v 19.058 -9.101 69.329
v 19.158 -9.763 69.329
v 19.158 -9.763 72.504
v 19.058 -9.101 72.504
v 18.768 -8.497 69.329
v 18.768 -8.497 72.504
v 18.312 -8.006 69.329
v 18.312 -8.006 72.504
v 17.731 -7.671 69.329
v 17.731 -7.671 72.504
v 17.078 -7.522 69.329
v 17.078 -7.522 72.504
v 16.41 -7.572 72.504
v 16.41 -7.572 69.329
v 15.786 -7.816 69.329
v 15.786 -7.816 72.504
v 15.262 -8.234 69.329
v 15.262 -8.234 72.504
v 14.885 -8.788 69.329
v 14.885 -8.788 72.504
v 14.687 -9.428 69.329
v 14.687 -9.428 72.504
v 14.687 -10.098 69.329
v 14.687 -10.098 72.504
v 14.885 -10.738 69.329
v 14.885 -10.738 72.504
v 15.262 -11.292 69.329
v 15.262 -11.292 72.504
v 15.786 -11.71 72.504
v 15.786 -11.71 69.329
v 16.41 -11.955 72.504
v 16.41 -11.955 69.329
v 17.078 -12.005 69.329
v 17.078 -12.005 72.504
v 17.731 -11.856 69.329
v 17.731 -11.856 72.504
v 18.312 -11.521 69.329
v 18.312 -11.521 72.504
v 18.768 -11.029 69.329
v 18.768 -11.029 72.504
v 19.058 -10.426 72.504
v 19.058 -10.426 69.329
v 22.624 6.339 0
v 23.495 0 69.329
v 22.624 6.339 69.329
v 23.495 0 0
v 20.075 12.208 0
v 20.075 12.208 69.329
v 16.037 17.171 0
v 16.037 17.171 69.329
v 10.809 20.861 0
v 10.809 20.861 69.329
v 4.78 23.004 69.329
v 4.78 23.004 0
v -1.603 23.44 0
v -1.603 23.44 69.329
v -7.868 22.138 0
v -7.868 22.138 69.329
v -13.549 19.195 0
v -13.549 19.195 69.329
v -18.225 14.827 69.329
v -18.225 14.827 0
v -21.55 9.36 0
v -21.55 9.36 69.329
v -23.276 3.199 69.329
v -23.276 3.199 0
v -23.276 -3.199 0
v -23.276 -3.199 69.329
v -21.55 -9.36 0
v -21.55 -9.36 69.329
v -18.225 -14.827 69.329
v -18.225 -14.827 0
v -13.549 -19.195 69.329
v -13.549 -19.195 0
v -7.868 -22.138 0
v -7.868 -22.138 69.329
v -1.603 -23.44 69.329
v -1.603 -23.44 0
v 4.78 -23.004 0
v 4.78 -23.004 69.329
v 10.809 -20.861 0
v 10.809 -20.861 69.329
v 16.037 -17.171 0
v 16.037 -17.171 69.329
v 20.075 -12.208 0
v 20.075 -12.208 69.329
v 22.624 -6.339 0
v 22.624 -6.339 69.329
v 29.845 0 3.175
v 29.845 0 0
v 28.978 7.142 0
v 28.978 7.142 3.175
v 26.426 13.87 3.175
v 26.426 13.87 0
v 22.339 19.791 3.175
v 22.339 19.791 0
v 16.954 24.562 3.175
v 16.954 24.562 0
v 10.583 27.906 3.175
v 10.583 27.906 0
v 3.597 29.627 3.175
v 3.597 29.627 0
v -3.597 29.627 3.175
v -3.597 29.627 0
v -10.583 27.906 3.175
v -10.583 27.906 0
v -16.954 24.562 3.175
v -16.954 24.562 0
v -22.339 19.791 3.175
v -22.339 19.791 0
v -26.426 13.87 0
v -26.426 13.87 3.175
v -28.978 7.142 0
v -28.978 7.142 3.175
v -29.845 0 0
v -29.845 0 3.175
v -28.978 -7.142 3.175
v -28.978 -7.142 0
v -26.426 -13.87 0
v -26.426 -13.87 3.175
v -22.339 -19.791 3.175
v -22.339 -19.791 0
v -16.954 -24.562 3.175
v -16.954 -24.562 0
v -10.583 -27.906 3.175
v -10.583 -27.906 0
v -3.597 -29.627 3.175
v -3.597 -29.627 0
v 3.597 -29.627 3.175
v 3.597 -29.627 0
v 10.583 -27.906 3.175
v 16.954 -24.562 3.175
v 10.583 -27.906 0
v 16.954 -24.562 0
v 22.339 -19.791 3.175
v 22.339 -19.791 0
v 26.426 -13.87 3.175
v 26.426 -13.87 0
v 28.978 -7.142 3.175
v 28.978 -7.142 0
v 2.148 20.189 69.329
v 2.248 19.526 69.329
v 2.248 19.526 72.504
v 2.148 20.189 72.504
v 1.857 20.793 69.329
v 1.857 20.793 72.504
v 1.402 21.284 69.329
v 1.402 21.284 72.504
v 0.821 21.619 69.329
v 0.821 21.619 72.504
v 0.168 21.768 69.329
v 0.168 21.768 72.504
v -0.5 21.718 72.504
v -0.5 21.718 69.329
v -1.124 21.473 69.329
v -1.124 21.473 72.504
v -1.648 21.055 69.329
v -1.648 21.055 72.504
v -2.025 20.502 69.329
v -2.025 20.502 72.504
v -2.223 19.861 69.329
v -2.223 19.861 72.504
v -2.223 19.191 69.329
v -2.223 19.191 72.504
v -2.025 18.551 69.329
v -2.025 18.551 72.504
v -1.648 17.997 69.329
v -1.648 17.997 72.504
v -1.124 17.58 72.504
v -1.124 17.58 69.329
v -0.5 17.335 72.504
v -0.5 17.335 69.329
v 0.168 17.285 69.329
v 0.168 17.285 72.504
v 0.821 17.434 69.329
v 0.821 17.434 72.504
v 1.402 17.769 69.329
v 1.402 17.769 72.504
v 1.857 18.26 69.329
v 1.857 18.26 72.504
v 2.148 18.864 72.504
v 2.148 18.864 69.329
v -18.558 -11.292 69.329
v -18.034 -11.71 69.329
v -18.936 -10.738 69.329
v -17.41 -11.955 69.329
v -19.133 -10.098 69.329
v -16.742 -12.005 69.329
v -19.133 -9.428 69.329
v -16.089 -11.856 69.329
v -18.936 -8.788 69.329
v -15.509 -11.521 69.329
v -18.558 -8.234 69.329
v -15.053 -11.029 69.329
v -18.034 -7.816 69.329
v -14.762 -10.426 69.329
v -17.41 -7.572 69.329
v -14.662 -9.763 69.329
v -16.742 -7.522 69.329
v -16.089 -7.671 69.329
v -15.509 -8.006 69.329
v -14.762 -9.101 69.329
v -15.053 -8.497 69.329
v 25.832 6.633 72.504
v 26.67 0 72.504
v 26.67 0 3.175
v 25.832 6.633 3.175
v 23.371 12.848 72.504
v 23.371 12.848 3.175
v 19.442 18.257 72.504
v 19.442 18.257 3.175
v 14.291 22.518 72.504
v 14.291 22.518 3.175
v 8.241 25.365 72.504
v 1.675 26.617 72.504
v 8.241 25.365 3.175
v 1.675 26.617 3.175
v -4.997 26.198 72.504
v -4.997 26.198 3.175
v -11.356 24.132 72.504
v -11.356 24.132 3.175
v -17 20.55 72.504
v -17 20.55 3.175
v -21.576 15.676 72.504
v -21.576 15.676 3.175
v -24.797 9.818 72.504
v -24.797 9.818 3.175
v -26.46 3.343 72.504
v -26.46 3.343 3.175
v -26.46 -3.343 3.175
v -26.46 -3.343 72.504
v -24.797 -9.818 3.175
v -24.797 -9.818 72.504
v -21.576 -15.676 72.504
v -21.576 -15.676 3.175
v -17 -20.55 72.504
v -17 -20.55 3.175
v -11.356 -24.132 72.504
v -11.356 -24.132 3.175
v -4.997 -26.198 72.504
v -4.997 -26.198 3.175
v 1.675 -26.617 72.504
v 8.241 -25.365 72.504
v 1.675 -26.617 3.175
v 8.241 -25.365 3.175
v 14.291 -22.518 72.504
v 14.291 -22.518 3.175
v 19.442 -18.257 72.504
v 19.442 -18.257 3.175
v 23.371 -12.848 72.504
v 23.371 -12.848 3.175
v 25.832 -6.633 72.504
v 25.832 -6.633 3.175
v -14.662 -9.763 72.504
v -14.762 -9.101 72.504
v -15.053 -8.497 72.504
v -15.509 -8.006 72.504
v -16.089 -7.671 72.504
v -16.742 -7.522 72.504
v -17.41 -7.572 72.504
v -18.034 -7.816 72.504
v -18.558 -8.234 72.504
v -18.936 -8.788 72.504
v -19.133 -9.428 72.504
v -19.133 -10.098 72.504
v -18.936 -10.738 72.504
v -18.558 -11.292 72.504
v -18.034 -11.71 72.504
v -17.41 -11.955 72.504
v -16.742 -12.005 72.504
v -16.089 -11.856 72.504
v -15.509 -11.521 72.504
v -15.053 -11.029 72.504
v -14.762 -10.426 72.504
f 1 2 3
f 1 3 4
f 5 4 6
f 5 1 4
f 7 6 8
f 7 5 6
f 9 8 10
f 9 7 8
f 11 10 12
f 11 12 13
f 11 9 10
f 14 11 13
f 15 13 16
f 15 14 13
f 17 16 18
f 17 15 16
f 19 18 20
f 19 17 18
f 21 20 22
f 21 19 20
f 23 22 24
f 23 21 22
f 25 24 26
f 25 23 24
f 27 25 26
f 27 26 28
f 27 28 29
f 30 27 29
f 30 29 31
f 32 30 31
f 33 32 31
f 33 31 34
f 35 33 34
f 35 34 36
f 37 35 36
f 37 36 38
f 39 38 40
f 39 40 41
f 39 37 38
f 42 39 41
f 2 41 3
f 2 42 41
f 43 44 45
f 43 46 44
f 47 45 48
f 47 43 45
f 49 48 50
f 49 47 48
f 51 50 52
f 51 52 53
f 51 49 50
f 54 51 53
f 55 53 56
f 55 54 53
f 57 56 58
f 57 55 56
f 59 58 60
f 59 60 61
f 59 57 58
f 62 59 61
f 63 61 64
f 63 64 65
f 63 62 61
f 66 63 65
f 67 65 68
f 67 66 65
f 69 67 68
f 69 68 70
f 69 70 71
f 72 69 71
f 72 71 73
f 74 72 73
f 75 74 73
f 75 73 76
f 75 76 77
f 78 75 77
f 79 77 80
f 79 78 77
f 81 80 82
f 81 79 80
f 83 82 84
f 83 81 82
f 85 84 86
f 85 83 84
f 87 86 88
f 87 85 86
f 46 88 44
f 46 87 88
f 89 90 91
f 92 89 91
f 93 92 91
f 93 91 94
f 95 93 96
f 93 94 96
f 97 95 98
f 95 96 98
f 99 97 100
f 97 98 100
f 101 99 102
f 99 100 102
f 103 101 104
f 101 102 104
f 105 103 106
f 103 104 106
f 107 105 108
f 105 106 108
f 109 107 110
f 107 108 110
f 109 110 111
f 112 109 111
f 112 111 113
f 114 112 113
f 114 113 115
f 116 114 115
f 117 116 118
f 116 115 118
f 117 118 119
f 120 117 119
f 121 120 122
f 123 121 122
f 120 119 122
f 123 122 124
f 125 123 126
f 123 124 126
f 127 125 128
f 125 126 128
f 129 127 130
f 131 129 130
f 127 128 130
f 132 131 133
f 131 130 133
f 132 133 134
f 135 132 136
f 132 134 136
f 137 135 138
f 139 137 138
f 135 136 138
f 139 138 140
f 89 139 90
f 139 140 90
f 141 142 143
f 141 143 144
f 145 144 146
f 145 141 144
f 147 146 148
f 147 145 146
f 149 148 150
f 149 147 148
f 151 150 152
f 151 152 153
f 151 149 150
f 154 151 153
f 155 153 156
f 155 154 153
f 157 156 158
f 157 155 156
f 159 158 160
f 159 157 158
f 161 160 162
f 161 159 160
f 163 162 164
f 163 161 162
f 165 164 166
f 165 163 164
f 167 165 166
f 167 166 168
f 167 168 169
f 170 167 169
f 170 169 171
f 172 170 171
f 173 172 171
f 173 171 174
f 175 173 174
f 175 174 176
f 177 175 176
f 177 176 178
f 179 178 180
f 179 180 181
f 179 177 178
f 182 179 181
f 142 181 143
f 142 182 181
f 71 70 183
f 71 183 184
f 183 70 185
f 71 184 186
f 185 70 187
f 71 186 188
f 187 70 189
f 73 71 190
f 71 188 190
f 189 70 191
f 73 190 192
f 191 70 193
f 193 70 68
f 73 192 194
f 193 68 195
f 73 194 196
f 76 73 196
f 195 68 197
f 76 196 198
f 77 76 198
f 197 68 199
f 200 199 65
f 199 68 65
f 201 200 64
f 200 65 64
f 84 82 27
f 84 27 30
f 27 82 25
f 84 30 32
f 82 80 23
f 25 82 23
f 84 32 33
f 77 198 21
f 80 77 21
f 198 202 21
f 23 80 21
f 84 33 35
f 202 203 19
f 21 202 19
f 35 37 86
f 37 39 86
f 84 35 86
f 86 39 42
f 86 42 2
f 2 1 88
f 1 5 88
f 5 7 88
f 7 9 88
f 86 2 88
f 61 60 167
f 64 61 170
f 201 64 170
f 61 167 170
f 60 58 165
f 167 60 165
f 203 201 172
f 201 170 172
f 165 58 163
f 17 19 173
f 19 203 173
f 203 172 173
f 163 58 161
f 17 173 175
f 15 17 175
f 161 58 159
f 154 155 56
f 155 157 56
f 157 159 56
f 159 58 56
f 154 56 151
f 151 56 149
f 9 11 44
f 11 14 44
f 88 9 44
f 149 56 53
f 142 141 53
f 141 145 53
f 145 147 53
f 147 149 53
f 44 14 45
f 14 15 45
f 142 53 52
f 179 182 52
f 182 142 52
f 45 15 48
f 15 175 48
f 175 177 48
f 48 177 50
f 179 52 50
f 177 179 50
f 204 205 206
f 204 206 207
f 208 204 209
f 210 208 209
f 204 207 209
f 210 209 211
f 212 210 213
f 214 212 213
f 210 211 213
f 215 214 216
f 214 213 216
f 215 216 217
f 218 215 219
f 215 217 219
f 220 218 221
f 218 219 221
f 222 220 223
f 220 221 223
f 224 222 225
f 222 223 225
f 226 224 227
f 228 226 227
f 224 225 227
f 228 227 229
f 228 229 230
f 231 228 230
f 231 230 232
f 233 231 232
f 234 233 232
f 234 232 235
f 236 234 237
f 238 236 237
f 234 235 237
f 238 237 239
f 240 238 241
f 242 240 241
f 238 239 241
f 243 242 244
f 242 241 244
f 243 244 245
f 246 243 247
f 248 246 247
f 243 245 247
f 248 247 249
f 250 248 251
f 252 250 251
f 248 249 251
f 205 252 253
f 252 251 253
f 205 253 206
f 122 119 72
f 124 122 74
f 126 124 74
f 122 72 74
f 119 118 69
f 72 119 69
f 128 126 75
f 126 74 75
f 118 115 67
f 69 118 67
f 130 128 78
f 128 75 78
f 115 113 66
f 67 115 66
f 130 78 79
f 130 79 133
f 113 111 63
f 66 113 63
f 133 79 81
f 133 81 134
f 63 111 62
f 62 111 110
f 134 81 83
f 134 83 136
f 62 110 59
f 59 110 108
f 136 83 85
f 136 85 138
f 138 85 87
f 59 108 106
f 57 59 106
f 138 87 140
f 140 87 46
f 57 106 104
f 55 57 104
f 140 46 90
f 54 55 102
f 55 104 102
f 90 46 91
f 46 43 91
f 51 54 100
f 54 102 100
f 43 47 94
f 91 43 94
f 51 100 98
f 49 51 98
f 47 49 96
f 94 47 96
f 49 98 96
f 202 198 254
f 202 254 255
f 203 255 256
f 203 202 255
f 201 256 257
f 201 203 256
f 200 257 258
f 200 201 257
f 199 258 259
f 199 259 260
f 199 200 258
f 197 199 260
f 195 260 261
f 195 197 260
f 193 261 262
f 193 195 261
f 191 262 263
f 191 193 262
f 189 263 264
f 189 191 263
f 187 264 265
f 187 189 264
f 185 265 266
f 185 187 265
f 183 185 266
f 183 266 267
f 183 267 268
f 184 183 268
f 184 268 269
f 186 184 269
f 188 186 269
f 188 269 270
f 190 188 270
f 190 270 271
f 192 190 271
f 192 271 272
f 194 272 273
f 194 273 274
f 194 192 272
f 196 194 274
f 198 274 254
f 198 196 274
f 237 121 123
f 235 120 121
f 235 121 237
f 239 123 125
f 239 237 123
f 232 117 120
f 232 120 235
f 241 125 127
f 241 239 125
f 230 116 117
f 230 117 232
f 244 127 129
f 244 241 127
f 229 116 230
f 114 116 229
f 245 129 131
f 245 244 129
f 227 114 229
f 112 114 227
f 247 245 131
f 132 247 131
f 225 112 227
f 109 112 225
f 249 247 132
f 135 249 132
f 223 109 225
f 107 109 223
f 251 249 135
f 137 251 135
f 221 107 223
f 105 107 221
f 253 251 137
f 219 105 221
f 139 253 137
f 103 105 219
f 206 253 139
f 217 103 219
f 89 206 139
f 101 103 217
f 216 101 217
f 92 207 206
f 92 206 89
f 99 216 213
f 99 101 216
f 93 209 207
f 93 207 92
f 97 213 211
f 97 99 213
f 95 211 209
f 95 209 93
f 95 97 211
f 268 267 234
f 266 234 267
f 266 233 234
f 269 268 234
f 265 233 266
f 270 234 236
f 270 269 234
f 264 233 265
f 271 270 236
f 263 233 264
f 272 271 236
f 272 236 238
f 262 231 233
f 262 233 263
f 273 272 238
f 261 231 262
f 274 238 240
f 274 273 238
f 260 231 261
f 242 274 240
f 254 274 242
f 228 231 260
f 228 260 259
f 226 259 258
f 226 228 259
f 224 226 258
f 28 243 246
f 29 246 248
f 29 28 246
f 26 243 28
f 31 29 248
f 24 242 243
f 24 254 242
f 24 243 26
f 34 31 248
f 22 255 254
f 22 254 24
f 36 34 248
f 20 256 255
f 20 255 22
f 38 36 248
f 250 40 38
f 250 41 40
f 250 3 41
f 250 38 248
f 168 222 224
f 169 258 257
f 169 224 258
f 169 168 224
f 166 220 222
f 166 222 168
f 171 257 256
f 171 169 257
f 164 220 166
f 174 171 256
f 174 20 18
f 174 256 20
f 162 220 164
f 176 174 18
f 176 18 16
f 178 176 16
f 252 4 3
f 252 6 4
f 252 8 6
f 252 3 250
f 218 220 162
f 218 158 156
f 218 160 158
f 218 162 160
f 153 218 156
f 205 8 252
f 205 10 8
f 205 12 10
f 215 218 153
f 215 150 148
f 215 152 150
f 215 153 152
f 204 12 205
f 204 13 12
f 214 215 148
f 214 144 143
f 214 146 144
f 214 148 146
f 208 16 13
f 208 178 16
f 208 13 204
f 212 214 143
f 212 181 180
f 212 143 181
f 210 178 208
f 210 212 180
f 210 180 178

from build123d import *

# Parameters (mm, degrees)
F0_R     = 29.845
F0_R_2   = 23.495
F1_DEPTH = 3.175
F2_R     = 26.67
F2_R_2   = 23.495
F3_DEPTH = 66.1543
F4_R     = 26.67
F4_R_2   = 2.2479
F5_DEPTH = 3.175


with BuildPart() as f1:
    # F0 (on Top) → F1 (new body)
    with BuildSketch(Plane.XY):
        Circle(F0_R)
        Circle(F0_R_2, mode=Mode.SUBTRACT)
    extrude(amount=F1_DEPTH)

    # F2 (on face) → F3 (join)
    with BuildSketch(Plane.XY.offset(3.175)):
        Circle(F2_R)
        Circle(F2_R_2, mode=Mode.SUBTRACT)
    extrude(amount=F3_DEPTH)

    # F4 (on face) → F5 (join)
    with BuildSketch(Plane.XY.offset(69.3293)):
        Circle(F4_R)
        with Locations((-16.910229, -9.763125)):
            Circle(F4_R_2, mode=Mode.SUBTRACT)
        with Locations((16.910229, -9.763125)):
            Circle(F4_R_2, mode=Mode.SUBTRACT)
        with Locations((0, 19.52625)):
            Circle(F4_R_2, mode=Mode.SUBTRACT)
    extrude(amount=F5_DEPTH)


solid = f1.part
